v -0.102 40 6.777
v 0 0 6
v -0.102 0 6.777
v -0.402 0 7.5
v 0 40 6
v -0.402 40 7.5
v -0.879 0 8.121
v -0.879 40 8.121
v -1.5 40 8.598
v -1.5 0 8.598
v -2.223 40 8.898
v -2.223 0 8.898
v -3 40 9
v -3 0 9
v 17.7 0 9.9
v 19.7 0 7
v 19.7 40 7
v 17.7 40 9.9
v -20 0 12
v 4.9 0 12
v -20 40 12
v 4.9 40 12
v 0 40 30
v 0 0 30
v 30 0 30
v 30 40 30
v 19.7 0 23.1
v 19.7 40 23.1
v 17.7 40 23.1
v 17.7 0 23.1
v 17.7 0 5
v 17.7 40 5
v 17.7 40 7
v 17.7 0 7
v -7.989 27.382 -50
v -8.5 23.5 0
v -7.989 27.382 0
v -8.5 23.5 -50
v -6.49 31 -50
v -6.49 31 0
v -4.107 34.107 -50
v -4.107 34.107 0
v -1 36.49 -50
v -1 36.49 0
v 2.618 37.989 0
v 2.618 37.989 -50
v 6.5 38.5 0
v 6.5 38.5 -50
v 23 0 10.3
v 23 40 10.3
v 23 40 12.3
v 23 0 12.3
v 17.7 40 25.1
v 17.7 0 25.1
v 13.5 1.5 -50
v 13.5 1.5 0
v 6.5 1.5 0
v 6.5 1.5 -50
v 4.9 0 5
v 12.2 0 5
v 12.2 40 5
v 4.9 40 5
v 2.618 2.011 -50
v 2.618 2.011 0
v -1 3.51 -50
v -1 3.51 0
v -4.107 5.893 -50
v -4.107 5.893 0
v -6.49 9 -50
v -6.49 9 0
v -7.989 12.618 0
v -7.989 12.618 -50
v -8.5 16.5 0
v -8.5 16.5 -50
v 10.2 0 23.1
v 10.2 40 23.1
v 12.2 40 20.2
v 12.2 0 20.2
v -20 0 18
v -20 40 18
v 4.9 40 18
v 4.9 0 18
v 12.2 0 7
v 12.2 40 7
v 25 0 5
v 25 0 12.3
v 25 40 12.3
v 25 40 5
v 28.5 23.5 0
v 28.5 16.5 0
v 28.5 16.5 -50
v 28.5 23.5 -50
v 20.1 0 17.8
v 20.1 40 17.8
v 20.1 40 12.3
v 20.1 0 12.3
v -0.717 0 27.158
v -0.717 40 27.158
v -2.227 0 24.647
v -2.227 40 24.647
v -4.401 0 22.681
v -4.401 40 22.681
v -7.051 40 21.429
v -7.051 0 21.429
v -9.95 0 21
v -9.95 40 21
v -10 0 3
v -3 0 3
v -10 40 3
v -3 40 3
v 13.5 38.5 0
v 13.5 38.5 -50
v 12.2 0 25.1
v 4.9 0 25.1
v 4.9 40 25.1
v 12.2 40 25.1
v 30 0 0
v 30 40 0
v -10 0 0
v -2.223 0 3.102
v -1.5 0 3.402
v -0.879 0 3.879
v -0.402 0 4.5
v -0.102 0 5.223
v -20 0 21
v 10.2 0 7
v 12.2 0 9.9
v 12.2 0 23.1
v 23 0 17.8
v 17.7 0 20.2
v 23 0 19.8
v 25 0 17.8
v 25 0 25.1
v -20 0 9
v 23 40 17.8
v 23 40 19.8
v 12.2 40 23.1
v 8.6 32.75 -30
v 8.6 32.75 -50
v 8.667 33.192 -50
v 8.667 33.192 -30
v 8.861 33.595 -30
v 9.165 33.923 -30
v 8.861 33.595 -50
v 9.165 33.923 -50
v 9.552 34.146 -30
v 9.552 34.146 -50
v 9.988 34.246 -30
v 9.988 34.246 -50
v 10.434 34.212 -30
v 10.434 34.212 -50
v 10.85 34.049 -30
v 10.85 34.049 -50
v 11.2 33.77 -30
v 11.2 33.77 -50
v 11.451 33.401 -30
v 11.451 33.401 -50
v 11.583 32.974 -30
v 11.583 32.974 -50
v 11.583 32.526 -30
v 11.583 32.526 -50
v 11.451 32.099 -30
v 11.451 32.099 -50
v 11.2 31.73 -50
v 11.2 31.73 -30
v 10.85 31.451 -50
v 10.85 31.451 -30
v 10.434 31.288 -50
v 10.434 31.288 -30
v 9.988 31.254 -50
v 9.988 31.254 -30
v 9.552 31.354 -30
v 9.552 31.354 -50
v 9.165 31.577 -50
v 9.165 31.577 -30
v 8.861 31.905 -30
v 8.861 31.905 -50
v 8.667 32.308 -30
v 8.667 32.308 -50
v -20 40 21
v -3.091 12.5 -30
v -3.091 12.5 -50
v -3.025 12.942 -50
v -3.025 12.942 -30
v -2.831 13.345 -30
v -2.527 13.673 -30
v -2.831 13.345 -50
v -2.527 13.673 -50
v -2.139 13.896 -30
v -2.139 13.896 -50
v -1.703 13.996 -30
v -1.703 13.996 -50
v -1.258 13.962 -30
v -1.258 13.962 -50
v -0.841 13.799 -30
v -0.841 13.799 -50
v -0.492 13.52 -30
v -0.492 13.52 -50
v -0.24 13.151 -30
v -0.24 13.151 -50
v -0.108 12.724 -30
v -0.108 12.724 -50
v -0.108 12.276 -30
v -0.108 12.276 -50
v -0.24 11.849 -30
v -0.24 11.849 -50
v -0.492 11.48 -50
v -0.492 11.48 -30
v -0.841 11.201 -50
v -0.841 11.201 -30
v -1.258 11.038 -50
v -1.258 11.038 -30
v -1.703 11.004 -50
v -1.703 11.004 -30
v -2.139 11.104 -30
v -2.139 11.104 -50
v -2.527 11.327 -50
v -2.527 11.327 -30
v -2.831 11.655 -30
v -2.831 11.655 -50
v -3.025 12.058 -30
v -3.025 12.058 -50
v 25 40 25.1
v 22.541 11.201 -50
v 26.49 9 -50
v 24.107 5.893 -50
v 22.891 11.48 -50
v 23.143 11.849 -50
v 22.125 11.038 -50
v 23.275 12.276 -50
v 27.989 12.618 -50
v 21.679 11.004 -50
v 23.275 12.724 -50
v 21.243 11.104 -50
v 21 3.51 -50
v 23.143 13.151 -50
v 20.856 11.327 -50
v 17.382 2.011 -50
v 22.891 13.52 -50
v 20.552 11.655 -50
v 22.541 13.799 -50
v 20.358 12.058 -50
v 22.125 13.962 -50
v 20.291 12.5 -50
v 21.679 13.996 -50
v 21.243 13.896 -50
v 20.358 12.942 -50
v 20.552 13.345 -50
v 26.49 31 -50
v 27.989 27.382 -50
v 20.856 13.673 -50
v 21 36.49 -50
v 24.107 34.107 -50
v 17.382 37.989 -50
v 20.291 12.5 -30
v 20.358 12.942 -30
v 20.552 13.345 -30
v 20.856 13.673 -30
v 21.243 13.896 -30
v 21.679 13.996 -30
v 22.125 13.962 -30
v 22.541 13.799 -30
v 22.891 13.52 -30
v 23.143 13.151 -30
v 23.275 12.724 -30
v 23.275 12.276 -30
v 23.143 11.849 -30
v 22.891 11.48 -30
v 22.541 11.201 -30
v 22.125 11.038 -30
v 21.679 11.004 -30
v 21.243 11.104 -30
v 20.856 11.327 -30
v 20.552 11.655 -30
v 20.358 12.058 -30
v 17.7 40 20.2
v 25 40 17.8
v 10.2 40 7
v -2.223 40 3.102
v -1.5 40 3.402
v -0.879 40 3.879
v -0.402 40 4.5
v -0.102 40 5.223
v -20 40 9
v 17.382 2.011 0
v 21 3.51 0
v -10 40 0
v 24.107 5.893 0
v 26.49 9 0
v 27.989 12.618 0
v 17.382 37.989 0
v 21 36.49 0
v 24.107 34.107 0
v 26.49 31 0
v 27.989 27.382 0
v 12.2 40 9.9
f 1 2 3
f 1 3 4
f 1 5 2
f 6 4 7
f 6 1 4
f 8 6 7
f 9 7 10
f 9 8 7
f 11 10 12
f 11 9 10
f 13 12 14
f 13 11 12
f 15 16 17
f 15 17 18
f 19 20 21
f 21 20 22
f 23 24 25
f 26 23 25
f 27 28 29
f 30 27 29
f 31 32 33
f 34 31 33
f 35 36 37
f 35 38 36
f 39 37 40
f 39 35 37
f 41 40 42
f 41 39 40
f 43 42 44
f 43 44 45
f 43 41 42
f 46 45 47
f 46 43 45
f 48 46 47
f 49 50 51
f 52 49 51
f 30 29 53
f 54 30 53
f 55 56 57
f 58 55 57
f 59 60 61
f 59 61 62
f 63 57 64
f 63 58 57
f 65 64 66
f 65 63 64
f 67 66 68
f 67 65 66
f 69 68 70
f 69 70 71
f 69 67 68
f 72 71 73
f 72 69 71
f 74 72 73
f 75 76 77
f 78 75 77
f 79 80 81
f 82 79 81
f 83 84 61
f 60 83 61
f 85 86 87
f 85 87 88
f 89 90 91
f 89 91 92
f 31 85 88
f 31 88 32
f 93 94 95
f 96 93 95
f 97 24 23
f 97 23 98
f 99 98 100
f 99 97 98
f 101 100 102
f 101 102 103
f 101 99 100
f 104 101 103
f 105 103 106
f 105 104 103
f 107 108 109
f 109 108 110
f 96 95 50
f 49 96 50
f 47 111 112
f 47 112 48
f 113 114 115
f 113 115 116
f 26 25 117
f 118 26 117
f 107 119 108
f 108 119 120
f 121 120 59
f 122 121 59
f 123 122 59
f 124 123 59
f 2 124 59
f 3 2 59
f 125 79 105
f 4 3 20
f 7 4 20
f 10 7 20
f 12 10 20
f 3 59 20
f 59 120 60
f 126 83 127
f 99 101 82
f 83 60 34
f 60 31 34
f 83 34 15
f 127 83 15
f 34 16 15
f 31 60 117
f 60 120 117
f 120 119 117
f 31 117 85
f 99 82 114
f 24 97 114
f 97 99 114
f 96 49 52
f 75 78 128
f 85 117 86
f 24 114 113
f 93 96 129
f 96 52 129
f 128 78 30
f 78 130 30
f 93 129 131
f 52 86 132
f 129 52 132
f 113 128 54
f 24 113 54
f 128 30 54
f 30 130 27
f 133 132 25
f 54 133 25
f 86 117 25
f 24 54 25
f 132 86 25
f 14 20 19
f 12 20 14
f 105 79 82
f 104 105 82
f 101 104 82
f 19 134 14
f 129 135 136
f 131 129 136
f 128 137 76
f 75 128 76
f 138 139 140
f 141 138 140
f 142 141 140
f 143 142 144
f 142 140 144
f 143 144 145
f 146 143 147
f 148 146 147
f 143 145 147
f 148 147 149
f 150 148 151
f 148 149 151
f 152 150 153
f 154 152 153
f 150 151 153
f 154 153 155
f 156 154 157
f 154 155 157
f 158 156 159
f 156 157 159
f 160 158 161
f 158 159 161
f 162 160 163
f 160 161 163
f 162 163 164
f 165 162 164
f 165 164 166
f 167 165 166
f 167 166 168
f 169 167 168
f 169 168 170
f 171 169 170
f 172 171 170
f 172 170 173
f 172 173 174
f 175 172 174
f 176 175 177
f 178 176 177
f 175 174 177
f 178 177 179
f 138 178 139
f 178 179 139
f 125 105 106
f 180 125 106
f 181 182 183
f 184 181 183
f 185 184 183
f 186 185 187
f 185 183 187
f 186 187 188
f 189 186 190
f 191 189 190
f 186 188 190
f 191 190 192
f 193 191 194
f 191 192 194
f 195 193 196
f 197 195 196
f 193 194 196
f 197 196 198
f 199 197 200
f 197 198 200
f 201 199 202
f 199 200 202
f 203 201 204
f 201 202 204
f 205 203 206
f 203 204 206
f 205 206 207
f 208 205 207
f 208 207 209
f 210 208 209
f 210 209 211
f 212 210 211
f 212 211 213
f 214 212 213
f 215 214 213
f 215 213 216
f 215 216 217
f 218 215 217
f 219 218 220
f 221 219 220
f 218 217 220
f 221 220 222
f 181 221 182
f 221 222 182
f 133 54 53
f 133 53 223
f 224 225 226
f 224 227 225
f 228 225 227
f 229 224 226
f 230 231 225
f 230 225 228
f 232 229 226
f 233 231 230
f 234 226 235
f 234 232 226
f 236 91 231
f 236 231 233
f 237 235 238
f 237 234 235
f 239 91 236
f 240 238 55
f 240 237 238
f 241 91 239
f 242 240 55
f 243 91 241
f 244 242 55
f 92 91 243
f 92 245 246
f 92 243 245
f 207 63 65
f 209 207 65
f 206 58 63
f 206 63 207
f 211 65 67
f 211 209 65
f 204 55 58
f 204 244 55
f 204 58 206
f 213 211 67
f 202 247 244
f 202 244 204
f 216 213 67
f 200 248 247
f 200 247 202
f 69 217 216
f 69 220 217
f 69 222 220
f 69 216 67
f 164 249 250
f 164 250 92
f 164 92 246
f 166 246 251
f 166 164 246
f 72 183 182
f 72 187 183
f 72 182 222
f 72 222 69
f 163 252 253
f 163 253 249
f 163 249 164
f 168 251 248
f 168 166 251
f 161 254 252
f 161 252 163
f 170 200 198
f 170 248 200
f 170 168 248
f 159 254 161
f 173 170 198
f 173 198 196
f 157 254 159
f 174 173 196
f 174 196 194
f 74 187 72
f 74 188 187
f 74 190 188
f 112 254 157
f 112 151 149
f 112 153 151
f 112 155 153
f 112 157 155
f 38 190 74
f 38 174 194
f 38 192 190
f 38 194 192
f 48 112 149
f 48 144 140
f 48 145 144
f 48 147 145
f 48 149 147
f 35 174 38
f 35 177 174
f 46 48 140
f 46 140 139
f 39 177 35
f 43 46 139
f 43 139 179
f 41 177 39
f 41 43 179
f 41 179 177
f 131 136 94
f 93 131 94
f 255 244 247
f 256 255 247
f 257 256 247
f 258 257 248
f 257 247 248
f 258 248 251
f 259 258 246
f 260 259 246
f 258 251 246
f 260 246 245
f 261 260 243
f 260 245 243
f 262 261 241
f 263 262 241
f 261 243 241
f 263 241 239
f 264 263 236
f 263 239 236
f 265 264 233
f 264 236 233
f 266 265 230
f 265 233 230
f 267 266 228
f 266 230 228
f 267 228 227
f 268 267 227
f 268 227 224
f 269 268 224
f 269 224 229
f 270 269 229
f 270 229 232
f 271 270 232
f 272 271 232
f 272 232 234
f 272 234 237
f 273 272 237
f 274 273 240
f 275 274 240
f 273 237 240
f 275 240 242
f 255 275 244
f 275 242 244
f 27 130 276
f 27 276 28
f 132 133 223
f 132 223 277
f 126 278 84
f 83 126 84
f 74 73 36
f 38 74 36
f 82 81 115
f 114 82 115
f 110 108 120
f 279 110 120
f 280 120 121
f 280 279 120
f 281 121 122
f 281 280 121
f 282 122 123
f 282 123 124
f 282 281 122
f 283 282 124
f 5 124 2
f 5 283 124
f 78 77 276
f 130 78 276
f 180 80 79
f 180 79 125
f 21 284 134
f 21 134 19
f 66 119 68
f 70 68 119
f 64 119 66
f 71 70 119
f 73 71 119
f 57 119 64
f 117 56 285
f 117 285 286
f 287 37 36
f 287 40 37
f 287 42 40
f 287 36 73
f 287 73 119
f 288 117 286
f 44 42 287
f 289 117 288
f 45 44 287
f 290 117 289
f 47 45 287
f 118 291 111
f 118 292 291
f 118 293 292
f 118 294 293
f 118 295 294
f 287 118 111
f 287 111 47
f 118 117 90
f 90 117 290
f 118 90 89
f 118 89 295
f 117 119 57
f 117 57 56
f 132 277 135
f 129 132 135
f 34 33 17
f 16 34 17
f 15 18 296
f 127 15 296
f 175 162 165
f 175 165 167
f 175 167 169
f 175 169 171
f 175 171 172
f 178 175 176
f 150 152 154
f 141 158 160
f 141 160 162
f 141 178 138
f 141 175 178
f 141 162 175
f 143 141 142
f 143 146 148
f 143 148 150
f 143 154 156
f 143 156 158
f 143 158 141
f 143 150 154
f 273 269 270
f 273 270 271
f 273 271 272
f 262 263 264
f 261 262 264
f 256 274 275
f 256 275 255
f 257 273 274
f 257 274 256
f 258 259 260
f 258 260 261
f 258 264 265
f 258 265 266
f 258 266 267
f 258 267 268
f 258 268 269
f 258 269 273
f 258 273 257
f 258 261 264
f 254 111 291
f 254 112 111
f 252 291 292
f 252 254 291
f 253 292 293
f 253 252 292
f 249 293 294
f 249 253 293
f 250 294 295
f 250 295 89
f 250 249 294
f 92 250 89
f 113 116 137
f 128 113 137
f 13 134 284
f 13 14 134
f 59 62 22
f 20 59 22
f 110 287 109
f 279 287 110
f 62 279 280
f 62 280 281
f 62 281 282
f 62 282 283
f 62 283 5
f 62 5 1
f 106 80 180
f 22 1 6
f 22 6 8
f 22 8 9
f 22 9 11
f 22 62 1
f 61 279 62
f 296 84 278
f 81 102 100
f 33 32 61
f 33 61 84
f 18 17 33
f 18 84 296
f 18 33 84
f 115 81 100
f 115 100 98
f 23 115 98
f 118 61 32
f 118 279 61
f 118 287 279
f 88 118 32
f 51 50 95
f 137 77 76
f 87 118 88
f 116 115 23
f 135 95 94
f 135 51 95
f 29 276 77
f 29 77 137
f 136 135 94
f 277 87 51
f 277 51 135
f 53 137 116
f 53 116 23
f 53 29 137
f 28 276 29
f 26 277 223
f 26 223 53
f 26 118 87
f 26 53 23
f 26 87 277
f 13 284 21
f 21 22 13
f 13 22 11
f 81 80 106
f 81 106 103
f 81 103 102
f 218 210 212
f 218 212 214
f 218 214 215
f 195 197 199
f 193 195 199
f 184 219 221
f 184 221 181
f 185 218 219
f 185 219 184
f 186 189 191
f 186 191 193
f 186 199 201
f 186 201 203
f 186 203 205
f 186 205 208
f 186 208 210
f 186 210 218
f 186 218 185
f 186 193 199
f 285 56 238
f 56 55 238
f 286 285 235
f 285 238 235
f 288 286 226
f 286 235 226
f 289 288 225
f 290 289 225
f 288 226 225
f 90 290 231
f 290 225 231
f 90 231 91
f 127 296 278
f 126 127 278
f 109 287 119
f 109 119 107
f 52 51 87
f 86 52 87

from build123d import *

# Parameters (mm, degrees)
SKETCH5_W           = 30
SKETCH5_H           = 30
BOSS_EXTRUDE3_DEPTH = 40
CUT_EXTRUDE1_DEPTH  = 50
SKETCH8_W           = 4.9
SKETCH8_H           = 6
CUT_EXTRUDE3_DEPTH  = 40
SKETCH10_W          = 3
SKETCH10_H          = 40
BOSS_EXTRUDE4_DEPTH = 10
SKETCH11_W          = 37
SKETCH11_H          = 37
BOSS_EXTRUDE5_DEPTH = 50
SKETCH14_R          = 1.5
CUT_EXTRUDE4_DEPTH  = 20
FILLET2_R           = 15
FILLET3_R           = 3
FILLET4_R           = 10
SKETCH15_W          = 3
SKETCH15_H          = 40
BOSS_EXTRUDE6_DEPTH = 10


# Some blends are built 0.0001 mm under size
with BuildPart() as part:
    # Sketch5 → Boss-Extrude3 (new body)
    with BuildSketch(Plane(origin=(0, 0, 0), x_dir=(1, 0, 0), z_dir=(0, 1, 0))):
        with Locations((15, -15)):
            Rectangle(SKETCH5_W, SKETCH5_H)
    extrude(amount=BOSS_EXTRUDE3_DEPTH)

    # Sketch6 → Cut-Extrude1 (cut)
    with BuildSketch(Plane(origin=(0, 40, 0), x_dir=(1, 0, 0), z_dir=(0, 1, 0))):
        Polygon((12.2, -5), (4.9, -5), (4.9, -15.05), (20.1, -15.05), (20.1, -12.3), (23, -10.3), (23, -12.3), (25, -12.3), (25, -5), (17.7, -5), (17.7, -7), (19.7, -7), (17.7, -9.9), (12.2, -9.9), (10.2, -7), (12.2, -7), align=None)
        Polygon((20.1, -15.05), (4.9, -15.05), (4.9, -25.1), (12.2, -25.1), (12.2, -23.1), (10.2, -23.1), (12.2, -20.2), (17.7, -20.2), (19.7, -23.1), (17.7, -23.1), (17.7, -25.1), (25, -25.1), (25, -17.8), (23, -17.8), (23, -19.8), (20.1, -17.8), align=None)
    extrude(amount=-CUT_EXTRUDE1_DEPTH, mode=Mode.SUBTRACT)

    # Sketch8 → Cut-Extrude3 (cut)
    with BuildSketch(Plane(origin=(0, 40, 0), x_dir=(1, 0, 0), z_dir=(0, 1, 0))):
        with Locations((2.45, -15)):
            Rectangle(SKETCH8_W, SKETCH8_H)
    extrude(amount=-CUT_EXTRUDE3_DEPTH, mode=Mode.SUBTRACT)

    # Sketch10 → Boss-Extrude4 (add)
    with BuildSketch(Plane.ZY):
        with Locations((1.5, 20)):
            Rectangle(SKETCH10_W, SKETCH10_H)
        with Locations((10.5, 20)):
            Rectangle(SKETCH10_W, SKETCH10_H)
        with Locations((19.5, 20)):
            Rectangle(SKETCH10_W, SKETCH10_H)
    extrude(amount=BOSS_EXTRUDE4_DEPTH)

    # Sketch11 → Boss-Extrude5 (add)
    with BuildSketch(Plane(origin=(0, 0, 0), x_dir=(-1, 0, 0), z_dir=(0, 0, -1))):
        with Locations((-10, 20)):
            Rectangle(SKETCH11_W, SKETCH11_H)
    extrude(amount=BOSS_EXTRUDE5_DEPTH)

    # Sketch14 → Cut-Extrude4 (cut)
    with BuildSketch(Plane(origin=(0, 0, -50), x_dir=(-1, 0, 0), z_dir=(0, 0, -1))):
        with Locations((-10.1, 32.75)):
            Circle(SKETCH14_R)
        with Locations((1.591342951, 12.5)):
            Circle(SKETCH14_R)
        with Locations((-21.791342951, 12.5)):
            Circle(SKETCH14_R)
    extrude(amount=-CUT_EXTRUDE4_DEPTH, mode=Mode.SUBTRACT)

    # Fillet2
    fillet2_edges = [part.edges().sort_by_distance(p)[0] for p in [
        (28.5, 38.5, -25),
        (28.5, 1.5, -25),
        (-8.5, 1.5, -25),
        (-8.5, 38.5, -25),
    ]]
    fillet(fillet2_edges, radius=FILLET2_R)

    # Fillet3
    fillet3_edges = [part.edges().sort_by_distance(p)[0] for p in [
        (0, 20, 3),
        (0, 20, 9),
    ]]
    fillet(fillet3_edges, radius=FILLET3_R - 0.0001)  # a hair under: the kernel refuses the full size

    # Fillet4
    # the kernel refuses this fillet: 10 mm, written as the material it adds along each edge
    with BuildSketch(Plane(origin=(0, 0, 21), x_dir=(0, 0, 1), z_dir=(0, 1, 0))) as fillet4_piece_1:
        with BuildLine():
            CenterArc((10, -9.949874371), FILLET4_R, 95.739170477, 84.260829523)
            Line((0, -9.949874371), (-0.2, -9.949874371))
            Line((-0.2, -9.949874371), (-0.2, 0))
            Line((-0.2, 0), (0, 0.2))
            ThreePointArc((0, 0.2), (4.5, 0.2), (8.98, 0.198997487))
            Line((8.98, 0.198997487), (9, 0))
        make_face()
    extrude(amount=40)

    # Sketch15 → Boss-Extrude6 (add)
    with BuildSketch(Plane.ZY.offset(10)):
        with Locations((10.5, 20)):
            Rectangle(SKETCH15_W, SKETCH15_H)
        with Locations((19.5, 20)):
            Rectangle(SKETCH15_W, SKETCH15_H)
    extrude(amount=BOSS_EXTRUDE6_DEPTH)


solid = part.part
